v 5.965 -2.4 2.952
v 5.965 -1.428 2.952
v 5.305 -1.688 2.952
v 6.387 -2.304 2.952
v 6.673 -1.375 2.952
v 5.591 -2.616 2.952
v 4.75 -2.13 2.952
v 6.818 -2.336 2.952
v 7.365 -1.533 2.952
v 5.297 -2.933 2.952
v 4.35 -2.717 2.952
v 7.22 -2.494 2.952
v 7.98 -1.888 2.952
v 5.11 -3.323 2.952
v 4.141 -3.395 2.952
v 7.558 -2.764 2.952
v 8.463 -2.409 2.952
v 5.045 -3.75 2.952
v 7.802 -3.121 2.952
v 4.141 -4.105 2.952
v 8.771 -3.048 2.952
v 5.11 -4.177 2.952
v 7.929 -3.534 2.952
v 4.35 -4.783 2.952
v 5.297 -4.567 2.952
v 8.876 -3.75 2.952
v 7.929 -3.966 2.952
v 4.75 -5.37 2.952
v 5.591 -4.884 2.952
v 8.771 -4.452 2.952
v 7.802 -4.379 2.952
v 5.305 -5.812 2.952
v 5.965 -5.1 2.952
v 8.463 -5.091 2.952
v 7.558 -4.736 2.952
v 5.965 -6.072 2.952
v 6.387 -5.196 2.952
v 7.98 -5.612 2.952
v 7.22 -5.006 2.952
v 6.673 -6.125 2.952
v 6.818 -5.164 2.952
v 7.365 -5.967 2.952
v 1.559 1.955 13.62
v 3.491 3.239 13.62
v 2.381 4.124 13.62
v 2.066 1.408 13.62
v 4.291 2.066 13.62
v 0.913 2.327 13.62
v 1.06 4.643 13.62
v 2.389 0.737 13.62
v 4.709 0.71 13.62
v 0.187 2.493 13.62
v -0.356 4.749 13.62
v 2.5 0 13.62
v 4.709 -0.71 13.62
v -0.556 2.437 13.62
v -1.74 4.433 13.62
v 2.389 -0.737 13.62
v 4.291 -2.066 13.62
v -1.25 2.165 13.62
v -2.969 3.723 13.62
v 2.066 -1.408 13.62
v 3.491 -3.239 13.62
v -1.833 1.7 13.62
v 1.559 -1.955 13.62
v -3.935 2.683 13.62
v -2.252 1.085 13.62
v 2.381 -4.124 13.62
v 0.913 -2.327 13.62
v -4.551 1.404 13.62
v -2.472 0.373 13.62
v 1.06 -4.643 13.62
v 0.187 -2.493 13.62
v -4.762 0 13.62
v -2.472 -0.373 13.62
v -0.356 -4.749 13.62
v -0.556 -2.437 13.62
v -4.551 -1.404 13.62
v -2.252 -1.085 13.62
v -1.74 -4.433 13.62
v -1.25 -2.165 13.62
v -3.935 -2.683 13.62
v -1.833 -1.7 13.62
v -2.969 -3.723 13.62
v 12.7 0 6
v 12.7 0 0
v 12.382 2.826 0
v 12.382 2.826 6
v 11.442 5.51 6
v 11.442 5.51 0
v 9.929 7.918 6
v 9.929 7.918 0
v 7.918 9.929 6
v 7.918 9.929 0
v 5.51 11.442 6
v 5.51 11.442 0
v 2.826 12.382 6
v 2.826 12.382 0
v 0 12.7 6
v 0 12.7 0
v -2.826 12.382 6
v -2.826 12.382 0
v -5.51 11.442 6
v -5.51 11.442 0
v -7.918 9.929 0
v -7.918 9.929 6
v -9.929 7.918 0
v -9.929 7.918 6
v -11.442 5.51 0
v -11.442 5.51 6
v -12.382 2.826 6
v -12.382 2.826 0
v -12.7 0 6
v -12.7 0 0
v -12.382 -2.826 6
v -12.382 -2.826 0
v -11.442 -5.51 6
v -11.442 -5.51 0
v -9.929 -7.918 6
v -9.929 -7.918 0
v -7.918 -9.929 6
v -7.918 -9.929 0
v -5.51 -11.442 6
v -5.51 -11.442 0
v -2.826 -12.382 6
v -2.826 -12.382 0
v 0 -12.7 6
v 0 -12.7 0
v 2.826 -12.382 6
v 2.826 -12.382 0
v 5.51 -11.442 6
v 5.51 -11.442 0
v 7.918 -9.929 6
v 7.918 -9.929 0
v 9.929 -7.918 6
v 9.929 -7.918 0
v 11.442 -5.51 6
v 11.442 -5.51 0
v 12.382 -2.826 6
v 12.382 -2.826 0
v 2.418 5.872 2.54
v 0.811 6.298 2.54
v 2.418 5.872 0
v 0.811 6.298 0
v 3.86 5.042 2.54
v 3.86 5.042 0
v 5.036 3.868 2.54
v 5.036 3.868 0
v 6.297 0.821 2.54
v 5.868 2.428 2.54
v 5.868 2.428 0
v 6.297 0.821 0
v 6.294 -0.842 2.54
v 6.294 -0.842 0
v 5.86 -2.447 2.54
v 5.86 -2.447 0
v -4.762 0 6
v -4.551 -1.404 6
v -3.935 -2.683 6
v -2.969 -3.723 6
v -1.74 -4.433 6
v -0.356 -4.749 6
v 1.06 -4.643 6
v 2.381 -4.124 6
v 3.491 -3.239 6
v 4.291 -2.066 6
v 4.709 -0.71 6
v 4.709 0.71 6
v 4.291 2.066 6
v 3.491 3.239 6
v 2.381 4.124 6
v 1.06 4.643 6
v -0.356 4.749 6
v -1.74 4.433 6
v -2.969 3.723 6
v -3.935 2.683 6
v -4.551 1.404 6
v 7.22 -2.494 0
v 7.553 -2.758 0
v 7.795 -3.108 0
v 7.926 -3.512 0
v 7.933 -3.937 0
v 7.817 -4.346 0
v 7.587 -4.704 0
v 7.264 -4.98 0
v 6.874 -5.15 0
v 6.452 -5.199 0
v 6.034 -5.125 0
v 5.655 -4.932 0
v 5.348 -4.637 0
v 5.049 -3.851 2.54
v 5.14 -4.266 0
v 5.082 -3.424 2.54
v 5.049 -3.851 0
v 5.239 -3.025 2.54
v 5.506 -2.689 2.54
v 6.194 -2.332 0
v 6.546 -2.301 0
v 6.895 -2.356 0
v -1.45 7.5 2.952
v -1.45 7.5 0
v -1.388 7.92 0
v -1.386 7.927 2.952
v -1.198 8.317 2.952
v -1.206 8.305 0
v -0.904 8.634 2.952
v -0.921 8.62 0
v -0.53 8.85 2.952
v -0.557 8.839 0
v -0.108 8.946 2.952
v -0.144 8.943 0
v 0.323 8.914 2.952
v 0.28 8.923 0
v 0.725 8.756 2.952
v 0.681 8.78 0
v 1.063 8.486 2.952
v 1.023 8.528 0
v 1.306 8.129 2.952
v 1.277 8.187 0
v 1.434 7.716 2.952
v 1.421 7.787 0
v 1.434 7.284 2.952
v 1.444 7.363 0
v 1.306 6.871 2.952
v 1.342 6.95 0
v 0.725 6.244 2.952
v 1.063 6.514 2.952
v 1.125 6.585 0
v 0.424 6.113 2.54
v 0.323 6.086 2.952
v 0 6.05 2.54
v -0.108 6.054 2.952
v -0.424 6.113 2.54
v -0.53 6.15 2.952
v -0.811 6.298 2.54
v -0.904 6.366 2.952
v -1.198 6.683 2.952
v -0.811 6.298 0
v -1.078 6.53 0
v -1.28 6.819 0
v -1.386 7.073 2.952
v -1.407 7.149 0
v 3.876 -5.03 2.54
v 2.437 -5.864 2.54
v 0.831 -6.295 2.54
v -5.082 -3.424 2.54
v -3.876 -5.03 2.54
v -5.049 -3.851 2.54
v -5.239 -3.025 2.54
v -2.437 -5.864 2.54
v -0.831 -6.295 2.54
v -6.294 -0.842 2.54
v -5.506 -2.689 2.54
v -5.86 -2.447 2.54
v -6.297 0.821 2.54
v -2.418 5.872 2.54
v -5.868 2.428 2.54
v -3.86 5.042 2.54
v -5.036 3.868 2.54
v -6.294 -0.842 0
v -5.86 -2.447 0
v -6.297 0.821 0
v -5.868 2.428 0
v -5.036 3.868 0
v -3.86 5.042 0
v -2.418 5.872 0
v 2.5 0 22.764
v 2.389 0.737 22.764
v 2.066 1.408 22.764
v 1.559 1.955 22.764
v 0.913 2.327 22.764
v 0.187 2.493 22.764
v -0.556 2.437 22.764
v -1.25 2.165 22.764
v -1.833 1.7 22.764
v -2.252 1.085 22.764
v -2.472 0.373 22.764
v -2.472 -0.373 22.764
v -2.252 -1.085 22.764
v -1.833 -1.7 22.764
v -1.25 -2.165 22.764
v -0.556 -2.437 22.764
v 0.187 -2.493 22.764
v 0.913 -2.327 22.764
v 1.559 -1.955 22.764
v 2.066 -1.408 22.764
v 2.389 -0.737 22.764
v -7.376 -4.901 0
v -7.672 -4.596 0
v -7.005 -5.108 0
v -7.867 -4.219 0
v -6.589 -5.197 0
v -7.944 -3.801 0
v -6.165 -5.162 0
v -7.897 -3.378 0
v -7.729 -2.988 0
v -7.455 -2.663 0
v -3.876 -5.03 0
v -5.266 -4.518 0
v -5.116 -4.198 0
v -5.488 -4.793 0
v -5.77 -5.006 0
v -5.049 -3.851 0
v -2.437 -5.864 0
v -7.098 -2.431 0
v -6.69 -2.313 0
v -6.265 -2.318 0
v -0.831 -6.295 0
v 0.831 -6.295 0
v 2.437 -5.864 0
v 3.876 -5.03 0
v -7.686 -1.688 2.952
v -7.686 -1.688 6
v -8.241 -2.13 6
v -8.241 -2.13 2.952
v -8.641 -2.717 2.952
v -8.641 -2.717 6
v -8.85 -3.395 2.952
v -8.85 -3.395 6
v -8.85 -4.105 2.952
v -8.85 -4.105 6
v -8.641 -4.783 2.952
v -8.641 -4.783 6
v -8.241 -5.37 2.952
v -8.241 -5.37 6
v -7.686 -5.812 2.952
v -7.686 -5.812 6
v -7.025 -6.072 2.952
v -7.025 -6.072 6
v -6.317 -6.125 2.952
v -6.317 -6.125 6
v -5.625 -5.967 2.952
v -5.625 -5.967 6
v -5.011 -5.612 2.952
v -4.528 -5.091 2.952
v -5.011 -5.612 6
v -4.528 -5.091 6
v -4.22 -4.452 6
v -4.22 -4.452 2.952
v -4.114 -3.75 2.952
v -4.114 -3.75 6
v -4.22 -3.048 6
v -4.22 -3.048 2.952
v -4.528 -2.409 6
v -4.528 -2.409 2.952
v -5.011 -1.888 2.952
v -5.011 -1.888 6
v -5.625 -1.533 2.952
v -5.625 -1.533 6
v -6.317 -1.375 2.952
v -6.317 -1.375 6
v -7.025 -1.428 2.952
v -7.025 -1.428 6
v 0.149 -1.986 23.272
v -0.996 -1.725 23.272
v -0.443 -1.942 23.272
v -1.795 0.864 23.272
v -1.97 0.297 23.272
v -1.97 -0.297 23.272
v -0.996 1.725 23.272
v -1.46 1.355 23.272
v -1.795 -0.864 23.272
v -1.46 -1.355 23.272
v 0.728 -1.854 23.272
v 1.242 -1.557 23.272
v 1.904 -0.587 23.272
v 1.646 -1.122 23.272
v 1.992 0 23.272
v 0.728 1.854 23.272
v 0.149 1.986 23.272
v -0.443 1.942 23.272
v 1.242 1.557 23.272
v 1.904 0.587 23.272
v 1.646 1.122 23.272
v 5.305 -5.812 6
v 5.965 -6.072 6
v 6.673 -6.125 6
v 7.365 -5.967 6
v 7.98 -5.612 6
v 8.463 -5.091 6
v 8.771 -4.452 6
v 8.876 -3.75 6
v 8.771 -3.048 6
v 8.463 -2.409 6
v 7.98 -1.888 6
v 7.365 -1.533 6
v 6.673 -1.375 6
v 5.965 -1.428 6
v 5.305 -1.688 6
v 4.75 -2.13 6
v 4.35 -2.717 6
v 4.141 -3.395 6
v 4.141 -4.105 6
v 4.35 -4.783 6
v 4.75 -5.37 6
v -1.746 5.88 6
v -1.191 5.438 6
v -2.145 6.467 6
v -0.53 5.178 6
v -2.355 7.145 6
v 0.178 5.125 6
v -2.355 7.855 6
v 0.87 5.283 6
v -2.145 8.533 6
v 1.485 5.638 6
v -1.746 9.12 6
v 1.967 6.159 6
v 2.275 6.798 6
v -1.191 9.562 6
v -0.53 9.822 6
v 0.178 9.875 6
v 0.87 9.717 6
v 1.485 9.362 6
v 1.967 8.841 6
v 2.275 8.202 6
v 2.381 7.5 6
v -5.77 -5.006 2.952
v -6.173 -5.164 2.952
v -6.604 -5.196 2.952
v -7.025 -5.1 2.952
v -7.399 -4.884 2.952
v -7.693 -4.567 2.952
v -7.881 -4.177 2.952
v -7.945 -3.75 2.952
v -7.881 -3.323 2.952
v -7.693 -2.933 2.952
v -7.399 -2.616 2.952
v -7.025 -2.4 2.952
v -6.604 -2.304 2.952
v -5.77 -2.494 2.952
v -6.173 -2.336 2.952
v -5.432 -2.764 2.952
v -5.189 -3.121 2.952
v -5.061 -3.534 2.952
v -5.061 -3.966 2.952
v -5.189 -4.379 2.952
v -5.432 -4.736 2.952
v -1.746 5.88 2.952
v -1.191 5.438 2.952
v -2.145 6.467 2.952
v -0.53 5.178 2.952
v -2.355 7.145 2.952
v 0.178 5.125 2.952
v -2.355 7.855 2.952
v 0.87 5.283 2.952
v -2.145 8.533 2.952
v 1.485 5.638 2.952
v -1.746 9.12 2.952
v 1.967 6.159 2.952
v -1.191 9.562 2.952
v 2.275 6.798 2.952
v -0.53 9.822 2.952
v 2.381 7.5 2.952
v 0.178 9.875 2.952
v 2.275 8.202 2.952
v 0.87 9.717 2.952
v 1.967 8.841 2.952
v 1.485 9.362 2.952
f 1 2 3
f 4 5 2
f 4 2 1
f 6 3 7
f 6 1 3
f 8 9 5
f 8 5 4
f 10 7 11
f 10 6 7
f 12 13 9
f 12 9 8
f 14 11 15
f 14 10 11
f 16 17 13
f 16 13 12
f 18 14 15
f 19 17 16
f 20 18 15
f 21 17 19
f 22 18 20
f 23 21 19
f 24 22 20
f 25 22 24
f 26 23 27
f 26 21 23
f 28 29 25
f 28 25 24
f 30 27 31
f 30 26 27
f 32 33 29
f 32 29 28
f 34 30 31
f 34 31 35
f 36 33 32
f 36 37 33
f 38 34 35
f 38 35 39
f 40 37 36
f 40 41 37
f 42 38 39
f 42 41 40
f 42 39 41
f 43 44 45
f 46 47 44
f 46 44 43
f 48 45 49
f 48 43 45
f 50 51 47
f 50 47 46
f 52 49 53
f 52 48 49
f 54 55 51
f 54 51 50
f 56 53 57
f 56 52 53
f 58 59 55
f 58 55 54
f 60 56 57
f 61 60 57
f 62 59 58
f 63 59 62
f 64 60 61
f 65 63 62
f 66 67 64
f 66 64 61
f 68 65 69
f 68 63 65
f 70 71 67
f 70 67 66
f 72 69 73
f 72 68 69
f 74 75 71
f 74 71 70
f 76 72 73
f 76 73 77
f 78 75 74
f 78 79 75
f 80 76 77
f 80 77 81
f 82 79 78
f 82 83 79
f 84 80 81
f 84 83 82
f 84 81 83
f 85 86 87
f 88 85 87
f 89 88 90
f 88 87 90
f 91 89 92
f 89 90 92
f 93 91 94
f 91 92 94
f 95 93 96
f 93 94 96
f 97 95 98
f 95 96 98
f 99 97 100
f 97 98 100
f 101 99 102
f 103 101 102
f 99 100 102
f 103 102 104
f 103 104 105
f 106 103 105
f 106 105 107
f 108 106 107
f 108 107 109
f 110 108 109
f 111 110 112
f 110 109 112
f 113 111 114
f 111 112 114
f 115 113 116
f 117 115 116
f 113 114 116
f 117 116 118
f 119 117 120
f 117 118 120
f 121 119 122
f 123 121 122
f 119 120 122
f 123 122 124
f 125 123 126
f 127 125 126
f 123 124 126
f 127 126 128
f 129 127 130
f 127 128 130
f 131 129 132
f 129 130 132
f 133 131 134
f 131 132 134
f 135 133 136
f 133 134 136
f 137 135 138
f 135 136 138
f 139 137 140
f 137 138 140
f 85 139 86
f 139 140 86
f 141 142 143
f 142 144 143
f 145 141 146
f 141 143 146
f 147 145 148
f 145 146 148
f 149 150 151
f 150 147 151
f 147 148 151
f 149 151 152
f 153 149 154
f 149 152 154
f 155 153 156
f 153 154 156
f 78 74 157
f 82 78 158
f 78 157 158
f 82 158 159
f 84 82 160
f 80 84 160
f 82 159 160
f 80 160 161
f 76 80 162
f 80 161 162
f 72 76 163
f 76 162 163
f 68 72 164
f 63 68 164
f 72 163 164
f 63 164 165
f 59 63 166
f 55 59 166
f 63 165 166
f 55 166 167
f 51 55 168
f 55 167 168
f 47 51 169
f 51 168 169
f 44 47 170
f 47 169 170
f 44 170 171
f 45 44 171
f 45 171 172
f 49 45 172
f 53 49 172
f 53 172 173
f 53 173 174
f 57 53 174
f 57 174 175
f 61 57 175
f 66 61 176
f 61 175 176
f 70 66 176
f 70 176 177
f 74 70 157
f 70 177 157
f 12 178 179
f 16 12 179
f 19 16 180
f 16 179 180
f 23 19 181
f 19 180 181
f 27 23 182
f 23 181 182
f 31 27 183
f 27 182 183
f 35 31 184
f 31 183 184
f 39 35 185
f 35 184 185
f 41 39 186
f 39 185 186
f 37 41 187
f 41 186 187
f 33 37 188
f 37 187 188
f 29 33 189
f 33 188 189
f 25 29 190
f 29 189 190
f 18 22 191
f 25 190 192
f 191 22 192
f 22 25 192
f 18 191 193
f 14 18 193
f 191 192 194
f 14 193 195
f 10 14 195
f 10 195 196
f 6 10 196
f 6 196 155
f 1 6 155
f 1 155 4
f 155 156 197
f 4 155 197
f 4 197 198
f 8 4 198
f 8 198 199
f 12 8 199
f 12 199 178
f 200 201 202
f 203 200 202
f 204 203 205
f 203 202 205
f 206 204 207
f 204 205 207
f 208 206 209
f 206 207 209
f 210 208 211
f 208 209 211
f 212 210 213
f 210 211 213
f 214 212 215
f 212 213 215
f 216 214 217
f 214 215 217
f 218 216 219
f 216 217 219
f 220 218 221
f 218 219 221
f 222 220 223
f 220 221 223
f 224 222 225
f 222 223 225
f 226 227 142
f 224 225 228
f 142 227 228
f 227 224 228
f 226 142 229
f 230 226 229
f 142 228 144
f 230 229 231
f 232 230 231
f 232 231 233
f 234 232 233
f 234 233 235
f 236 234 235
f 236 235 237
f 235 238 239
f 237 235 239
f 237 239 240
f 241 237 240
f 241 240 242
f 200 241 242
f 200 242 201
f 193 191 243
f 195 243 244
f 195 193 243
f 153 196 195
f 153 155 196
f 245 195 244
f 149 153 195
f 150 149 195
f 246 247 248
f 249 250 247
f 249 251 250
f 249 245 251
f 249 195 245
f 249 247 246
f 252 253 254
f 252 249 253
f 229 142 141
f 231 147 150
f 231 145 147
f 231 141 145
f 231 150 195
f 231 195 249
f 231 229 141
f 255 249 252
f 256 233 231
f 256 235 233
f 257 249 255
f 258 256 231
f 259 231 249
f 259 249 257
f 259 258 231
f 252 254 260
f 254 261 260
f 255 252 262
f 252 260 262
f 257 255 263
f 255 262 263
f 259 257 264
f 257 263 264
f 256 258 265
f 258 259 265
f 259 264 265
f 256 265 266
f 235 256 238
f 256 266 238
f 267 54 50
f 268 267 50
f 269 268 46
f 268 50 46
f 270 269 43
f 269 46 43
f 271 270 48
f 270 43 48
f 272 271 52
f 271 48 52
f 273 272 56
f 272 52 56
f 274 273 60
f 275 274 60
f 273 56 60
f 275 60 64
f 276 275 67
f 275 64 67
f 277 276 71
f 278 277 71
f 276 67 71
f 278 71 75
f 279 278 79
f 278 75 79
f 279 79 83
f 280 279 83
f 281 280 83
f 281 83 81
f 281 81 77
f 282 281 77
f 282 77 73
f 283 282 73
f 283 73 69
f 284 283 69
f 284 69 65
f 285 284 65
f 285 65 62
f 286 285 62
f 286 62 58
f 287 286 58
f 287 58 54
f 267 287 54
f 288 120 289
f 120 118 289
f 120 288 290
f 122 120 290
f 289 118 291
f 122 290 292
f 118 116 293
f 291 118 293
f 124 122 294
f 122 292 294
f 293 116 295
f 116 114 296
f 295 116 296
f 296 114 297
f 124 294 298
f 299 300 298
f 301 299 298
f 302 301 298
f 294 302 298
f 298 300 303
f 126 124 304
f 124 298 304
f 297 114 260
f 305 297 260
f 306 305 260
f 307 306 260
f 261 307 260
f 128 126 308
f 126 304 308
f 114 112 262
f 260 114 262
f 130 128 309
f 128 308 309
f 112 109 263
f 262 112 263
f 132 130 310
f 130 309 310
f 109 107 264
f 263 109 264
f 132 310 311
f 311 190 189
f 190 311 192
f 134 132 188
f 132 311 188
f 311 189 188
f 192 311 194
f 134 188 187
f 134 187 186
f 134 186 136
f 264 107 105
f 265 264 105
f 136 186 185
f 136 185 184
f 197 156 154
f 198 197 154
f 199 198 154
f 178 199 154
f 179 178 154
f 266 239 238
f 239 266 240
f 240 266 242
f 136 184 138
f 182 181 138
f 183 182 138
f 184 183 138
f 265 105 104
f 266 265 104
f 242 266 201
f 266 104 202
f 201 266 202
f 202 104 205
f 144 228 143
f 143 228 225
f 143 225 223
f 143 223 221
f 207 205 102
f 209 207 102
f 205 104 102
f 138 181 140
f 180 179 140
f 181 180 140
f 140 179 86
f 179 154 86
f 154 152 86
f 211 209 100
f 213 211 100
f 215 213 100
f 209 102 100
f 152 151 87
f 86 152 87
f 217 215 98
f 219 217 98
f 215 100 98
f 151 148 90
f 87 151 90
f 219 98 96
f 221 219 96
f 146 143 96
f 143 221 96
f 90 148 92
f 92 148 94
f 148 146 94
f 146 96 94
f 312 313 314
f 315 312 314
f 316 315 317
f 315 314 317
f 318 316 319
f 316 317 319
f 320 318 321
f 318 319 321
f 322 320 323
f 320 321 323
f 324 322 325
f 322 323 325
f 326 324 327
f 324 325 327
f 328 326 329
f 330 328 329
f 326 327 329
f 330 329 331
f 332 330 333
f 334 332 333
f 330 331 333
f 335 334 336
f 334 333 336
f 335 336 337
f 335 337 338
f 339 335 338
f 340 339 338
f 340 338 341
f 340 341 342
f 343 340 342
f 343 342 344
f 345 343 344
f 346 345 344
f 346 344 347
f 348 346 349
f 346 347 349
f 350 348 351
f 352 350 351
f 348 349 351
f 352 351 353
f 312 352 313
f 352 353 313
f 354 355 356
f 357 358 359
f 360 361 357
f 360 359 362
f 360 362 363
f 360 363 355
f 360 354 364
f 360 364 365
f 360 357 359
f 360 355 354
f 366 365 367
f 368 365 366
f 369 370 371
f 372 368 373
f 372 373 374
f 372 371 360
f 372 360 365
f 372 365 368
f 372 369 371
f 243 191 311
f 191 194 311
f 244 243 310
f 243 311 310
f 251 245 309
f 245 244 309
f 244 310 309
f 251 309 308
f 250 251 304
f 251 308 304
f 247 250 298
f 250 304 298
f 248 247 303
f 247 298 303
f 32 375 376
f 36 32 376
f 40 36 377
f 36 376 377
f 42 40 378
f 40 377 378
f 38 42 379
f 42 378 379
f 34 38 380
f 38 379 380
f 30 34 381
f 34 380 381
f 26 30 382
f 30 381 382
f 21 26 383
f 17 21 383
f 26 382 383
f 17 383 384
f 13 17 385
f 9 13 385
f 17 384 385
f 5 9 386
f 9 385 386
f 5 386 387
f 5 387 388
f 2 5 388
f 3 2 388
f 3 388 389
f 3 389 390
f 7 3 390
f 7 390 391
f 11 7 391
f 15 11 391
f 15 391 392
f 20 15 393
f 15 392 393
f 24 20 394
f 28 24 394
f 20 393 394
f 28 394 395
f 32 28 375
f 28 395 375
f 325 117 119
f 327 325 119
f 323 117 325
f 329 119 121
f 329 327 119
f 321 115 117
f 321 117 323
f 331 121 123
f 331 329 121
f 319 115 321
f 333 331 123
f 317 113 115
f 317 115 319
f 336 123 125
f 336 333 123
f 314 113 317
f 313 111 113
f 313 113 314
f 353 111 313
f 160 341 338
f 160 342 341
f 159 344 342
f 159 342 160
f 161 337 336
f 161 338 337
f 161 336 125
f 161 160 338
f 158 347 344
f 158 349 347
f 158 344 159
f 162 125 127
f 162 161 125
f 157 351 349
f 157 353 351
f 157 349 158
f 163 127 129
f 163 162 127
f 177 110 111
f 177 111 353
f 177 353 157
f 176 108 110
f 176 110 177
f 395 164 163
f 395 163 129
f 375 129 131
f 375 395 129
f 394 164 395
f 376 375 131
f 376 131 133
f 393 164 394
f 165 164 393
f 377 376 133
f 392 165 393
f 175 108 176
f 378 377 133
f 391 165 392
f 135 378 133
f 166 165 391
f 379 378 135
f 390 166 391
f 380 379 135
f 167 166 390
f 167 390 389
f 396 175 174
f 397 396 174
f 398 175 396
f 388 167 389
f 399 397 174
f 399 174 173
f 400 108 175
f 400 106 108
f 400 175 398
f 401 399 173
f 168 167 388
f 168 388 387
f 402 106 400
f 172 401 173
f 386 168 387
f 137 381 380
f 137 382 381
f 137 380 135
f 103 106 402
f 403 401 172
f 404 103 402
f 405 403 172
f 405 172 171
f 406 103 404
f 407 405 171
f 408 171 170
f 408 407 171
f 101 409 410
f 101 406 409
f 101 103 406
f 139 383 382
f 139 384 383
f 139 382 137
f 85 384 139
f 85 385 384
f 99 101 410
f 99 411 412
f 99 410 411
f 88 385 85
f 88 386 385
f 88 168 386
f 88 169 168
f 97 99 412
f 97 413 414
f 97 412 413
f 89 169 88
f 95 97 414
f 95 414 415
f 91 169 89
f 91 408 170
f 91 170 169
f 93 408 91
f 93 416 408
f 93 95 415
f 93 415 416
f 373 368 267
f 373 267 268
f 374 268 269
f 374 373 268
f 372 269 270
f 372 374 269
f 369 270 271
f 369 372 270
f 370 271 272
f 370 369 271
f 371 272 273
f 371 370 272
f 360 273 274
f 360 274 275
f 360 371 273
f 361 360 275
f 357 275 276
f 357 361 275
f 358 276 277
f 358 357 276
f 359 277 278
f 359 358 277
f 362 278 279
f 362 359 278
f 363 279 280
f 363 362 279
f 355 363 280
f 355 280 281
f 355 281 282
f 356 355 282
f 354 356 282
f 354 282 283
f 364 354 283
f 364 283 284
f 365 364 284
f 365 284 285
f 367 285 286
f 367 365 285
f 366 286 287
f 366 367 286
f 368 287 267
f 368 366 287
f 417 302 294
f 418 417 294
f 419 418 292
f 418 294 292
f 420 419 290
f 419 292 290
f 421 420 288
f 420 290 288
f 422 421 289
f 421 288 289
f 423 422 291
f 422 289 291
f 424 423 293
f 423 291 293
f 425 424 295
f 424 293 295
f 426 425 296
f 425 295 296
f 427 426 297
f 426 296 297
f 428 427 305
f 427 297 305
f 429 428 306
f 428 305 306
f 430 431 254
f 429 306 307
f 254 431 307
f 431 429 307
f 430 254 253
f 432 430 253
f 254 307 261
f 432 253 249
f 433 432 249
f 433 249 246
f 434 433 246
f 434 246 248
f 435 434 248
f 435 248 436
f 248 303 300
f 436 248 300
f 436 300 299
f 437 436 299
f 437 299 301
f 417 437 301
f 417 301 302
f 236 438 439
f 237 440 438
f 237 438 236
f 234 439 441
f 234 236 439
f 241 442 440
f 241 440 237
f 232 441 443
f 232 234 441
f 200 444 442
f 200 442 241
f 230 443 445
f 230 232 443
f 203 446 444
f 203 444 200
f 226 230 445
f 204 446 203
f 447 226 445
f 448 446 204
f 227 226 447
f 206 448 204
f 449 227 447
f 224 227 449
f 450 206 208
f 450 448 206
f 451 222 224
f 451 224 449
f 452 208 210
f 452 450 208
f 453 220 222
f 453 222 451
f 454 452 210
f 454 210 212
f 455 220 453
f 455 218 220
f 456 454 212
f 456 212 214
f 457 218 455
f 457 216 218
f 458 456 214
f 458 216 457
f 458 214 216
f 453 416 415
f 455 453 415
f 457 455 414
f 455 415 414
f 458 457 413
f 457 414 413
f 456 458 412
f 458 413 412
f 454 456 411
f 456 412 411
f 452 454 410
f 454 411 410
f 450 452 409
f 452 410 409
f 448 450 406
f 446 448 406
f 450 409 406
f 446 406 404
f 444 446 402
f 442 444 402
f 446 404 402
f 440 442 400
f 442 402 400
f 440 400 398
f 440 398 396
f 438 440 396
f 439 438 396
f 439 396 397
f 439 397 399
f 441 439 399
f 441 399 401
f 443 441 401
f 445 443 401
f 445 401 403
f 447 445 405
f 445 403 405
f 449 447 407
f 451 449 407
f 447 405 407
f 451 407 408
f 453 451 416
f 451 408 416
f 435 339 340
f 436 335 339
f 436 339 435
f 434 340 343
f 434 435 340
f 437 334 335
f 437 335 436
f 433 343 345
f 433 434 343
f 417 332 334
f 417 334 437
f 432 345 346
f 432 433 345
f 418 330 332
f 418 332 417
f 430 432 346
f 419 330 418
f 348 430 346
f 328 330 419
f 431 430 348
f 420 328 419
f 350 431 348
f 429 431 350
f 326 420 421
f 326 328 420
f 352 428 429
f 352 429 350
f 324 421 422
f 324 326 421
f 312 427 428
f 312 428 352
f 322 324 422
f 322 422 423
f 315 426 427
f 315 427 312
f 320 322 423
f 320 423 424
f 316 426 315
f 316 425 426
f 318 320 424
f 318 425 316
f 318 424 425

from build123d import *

# Parameters (mm, degrees)
SKETCH1_R                    = 12.7
MOUNTING_FLANGE_DEPTH        = 6
SKETCH3_R                    = 6.35
MOTOR_SHAFT_RELIEF_DEPTH     = 2.54
SKETCH2_R                    = 2.5
DRIVE_SHAFT_DEPTH            = 17.272
CHAMFER1_SIZE                = 0.508
SKETCH5_R                    = 4.7625
SHAFT_SUPPORT_SHOULDER_DEPTH = 7.62
M2_5_CLEARANCE_HOLE_D        = 2.9
SKETCH8_R                    = 2.38125
M2_5_TIGHT_COUTERBORE_DEPTH  = 3.048
CIRPATTERN_COUNT             = 3


with BuildPart() as part:
    # Sketch1 → Mounting Flange (new body)
    with BuildSketch(Plane.XY):
        Circle(SKETCH1_R)
    extrude(amount=MOUNTING_FLANGE_DEPTH)

    # Sketch3 → Motor Shaft Relief (cut)
    with BuildSketch(Plane(origin=(0, 0, 0), x_dir=(-1, 0, 0), z_dir=(0, 0, -1))):
        Circle(SKETCH3_R)
    extrude(amount=-MOTOR_SHAFT_RELIEF_DEPTH, mode=Mode.SUBTRACT)

    # Sketch2 → Drive Shaft (add)
    with BuildSketch(Plane.XY.offset(6)):
        Circle(SKETCH2_R)
    extrude(amount=DRIVE_SHAFT_DEPTH)

    # Chamfer1
    chamfer1_edges = [part.edges().sort_by_distance(p)[0] for p in [
        (-2.5, 0, 23.272),
    ]]
    chamfer(chamfer1_edges, length=CHAMFER1_SIZE)

    # Sketch5 → Shaft Support Shoulder (add)
    with BuildSketch(Plane.XY.offset(6)):
        with Locations(Location((0, 0, 0), (0, 0, 180))):
            Circle(SKETCH5_R)
    extrude(amount=SHAFT_SUPPORT_SHOULDER_DEPTH)

    # M2.5 Clearance Hole (through all)
    with Locations(Plane.XY.offset(6)):
        with Locations((0, 7.5)):
            m2_5_clearance_hole = Hole(M2_5_CLEARANCE_HOLE_D / 2)

    # Sketch8 → M2.5 Tight Couterbore (cut)
    with BuildSketch(Plane.XY.offset(6)):
        with Locations((0, 7.5)):
            Circle(SKETCH8_R)
    m2_5_tight_couterbore = extrude(amount=-M2_5_TIGHT_COUTERBORE_DEPTH, mode=Mode.SUBTRACT)

    # CirPattern: M2.5 Clearance Hole, M2.5 Tight Couterbore ×3 about axis
    cirpattern_axis = Axis((0, 0, 0), (0, 0, 1))
    add([m2_5_clearance_hole.rotate(cirpattern_axis, i * 360 / CIRPATTERN_COUNT) for i in range(1, CIRPATTERN_COUNT)], mode=Mode.SUBTRACT)
    add([m2_5_tight_couterbore.rotate(cirpattern_axis, i * 360 / CIRPATTERN_COUNT) for i in range(1, CIRPATTERN_COUNT)], mode=Mode.SUBTRACT)


solid = part.part
